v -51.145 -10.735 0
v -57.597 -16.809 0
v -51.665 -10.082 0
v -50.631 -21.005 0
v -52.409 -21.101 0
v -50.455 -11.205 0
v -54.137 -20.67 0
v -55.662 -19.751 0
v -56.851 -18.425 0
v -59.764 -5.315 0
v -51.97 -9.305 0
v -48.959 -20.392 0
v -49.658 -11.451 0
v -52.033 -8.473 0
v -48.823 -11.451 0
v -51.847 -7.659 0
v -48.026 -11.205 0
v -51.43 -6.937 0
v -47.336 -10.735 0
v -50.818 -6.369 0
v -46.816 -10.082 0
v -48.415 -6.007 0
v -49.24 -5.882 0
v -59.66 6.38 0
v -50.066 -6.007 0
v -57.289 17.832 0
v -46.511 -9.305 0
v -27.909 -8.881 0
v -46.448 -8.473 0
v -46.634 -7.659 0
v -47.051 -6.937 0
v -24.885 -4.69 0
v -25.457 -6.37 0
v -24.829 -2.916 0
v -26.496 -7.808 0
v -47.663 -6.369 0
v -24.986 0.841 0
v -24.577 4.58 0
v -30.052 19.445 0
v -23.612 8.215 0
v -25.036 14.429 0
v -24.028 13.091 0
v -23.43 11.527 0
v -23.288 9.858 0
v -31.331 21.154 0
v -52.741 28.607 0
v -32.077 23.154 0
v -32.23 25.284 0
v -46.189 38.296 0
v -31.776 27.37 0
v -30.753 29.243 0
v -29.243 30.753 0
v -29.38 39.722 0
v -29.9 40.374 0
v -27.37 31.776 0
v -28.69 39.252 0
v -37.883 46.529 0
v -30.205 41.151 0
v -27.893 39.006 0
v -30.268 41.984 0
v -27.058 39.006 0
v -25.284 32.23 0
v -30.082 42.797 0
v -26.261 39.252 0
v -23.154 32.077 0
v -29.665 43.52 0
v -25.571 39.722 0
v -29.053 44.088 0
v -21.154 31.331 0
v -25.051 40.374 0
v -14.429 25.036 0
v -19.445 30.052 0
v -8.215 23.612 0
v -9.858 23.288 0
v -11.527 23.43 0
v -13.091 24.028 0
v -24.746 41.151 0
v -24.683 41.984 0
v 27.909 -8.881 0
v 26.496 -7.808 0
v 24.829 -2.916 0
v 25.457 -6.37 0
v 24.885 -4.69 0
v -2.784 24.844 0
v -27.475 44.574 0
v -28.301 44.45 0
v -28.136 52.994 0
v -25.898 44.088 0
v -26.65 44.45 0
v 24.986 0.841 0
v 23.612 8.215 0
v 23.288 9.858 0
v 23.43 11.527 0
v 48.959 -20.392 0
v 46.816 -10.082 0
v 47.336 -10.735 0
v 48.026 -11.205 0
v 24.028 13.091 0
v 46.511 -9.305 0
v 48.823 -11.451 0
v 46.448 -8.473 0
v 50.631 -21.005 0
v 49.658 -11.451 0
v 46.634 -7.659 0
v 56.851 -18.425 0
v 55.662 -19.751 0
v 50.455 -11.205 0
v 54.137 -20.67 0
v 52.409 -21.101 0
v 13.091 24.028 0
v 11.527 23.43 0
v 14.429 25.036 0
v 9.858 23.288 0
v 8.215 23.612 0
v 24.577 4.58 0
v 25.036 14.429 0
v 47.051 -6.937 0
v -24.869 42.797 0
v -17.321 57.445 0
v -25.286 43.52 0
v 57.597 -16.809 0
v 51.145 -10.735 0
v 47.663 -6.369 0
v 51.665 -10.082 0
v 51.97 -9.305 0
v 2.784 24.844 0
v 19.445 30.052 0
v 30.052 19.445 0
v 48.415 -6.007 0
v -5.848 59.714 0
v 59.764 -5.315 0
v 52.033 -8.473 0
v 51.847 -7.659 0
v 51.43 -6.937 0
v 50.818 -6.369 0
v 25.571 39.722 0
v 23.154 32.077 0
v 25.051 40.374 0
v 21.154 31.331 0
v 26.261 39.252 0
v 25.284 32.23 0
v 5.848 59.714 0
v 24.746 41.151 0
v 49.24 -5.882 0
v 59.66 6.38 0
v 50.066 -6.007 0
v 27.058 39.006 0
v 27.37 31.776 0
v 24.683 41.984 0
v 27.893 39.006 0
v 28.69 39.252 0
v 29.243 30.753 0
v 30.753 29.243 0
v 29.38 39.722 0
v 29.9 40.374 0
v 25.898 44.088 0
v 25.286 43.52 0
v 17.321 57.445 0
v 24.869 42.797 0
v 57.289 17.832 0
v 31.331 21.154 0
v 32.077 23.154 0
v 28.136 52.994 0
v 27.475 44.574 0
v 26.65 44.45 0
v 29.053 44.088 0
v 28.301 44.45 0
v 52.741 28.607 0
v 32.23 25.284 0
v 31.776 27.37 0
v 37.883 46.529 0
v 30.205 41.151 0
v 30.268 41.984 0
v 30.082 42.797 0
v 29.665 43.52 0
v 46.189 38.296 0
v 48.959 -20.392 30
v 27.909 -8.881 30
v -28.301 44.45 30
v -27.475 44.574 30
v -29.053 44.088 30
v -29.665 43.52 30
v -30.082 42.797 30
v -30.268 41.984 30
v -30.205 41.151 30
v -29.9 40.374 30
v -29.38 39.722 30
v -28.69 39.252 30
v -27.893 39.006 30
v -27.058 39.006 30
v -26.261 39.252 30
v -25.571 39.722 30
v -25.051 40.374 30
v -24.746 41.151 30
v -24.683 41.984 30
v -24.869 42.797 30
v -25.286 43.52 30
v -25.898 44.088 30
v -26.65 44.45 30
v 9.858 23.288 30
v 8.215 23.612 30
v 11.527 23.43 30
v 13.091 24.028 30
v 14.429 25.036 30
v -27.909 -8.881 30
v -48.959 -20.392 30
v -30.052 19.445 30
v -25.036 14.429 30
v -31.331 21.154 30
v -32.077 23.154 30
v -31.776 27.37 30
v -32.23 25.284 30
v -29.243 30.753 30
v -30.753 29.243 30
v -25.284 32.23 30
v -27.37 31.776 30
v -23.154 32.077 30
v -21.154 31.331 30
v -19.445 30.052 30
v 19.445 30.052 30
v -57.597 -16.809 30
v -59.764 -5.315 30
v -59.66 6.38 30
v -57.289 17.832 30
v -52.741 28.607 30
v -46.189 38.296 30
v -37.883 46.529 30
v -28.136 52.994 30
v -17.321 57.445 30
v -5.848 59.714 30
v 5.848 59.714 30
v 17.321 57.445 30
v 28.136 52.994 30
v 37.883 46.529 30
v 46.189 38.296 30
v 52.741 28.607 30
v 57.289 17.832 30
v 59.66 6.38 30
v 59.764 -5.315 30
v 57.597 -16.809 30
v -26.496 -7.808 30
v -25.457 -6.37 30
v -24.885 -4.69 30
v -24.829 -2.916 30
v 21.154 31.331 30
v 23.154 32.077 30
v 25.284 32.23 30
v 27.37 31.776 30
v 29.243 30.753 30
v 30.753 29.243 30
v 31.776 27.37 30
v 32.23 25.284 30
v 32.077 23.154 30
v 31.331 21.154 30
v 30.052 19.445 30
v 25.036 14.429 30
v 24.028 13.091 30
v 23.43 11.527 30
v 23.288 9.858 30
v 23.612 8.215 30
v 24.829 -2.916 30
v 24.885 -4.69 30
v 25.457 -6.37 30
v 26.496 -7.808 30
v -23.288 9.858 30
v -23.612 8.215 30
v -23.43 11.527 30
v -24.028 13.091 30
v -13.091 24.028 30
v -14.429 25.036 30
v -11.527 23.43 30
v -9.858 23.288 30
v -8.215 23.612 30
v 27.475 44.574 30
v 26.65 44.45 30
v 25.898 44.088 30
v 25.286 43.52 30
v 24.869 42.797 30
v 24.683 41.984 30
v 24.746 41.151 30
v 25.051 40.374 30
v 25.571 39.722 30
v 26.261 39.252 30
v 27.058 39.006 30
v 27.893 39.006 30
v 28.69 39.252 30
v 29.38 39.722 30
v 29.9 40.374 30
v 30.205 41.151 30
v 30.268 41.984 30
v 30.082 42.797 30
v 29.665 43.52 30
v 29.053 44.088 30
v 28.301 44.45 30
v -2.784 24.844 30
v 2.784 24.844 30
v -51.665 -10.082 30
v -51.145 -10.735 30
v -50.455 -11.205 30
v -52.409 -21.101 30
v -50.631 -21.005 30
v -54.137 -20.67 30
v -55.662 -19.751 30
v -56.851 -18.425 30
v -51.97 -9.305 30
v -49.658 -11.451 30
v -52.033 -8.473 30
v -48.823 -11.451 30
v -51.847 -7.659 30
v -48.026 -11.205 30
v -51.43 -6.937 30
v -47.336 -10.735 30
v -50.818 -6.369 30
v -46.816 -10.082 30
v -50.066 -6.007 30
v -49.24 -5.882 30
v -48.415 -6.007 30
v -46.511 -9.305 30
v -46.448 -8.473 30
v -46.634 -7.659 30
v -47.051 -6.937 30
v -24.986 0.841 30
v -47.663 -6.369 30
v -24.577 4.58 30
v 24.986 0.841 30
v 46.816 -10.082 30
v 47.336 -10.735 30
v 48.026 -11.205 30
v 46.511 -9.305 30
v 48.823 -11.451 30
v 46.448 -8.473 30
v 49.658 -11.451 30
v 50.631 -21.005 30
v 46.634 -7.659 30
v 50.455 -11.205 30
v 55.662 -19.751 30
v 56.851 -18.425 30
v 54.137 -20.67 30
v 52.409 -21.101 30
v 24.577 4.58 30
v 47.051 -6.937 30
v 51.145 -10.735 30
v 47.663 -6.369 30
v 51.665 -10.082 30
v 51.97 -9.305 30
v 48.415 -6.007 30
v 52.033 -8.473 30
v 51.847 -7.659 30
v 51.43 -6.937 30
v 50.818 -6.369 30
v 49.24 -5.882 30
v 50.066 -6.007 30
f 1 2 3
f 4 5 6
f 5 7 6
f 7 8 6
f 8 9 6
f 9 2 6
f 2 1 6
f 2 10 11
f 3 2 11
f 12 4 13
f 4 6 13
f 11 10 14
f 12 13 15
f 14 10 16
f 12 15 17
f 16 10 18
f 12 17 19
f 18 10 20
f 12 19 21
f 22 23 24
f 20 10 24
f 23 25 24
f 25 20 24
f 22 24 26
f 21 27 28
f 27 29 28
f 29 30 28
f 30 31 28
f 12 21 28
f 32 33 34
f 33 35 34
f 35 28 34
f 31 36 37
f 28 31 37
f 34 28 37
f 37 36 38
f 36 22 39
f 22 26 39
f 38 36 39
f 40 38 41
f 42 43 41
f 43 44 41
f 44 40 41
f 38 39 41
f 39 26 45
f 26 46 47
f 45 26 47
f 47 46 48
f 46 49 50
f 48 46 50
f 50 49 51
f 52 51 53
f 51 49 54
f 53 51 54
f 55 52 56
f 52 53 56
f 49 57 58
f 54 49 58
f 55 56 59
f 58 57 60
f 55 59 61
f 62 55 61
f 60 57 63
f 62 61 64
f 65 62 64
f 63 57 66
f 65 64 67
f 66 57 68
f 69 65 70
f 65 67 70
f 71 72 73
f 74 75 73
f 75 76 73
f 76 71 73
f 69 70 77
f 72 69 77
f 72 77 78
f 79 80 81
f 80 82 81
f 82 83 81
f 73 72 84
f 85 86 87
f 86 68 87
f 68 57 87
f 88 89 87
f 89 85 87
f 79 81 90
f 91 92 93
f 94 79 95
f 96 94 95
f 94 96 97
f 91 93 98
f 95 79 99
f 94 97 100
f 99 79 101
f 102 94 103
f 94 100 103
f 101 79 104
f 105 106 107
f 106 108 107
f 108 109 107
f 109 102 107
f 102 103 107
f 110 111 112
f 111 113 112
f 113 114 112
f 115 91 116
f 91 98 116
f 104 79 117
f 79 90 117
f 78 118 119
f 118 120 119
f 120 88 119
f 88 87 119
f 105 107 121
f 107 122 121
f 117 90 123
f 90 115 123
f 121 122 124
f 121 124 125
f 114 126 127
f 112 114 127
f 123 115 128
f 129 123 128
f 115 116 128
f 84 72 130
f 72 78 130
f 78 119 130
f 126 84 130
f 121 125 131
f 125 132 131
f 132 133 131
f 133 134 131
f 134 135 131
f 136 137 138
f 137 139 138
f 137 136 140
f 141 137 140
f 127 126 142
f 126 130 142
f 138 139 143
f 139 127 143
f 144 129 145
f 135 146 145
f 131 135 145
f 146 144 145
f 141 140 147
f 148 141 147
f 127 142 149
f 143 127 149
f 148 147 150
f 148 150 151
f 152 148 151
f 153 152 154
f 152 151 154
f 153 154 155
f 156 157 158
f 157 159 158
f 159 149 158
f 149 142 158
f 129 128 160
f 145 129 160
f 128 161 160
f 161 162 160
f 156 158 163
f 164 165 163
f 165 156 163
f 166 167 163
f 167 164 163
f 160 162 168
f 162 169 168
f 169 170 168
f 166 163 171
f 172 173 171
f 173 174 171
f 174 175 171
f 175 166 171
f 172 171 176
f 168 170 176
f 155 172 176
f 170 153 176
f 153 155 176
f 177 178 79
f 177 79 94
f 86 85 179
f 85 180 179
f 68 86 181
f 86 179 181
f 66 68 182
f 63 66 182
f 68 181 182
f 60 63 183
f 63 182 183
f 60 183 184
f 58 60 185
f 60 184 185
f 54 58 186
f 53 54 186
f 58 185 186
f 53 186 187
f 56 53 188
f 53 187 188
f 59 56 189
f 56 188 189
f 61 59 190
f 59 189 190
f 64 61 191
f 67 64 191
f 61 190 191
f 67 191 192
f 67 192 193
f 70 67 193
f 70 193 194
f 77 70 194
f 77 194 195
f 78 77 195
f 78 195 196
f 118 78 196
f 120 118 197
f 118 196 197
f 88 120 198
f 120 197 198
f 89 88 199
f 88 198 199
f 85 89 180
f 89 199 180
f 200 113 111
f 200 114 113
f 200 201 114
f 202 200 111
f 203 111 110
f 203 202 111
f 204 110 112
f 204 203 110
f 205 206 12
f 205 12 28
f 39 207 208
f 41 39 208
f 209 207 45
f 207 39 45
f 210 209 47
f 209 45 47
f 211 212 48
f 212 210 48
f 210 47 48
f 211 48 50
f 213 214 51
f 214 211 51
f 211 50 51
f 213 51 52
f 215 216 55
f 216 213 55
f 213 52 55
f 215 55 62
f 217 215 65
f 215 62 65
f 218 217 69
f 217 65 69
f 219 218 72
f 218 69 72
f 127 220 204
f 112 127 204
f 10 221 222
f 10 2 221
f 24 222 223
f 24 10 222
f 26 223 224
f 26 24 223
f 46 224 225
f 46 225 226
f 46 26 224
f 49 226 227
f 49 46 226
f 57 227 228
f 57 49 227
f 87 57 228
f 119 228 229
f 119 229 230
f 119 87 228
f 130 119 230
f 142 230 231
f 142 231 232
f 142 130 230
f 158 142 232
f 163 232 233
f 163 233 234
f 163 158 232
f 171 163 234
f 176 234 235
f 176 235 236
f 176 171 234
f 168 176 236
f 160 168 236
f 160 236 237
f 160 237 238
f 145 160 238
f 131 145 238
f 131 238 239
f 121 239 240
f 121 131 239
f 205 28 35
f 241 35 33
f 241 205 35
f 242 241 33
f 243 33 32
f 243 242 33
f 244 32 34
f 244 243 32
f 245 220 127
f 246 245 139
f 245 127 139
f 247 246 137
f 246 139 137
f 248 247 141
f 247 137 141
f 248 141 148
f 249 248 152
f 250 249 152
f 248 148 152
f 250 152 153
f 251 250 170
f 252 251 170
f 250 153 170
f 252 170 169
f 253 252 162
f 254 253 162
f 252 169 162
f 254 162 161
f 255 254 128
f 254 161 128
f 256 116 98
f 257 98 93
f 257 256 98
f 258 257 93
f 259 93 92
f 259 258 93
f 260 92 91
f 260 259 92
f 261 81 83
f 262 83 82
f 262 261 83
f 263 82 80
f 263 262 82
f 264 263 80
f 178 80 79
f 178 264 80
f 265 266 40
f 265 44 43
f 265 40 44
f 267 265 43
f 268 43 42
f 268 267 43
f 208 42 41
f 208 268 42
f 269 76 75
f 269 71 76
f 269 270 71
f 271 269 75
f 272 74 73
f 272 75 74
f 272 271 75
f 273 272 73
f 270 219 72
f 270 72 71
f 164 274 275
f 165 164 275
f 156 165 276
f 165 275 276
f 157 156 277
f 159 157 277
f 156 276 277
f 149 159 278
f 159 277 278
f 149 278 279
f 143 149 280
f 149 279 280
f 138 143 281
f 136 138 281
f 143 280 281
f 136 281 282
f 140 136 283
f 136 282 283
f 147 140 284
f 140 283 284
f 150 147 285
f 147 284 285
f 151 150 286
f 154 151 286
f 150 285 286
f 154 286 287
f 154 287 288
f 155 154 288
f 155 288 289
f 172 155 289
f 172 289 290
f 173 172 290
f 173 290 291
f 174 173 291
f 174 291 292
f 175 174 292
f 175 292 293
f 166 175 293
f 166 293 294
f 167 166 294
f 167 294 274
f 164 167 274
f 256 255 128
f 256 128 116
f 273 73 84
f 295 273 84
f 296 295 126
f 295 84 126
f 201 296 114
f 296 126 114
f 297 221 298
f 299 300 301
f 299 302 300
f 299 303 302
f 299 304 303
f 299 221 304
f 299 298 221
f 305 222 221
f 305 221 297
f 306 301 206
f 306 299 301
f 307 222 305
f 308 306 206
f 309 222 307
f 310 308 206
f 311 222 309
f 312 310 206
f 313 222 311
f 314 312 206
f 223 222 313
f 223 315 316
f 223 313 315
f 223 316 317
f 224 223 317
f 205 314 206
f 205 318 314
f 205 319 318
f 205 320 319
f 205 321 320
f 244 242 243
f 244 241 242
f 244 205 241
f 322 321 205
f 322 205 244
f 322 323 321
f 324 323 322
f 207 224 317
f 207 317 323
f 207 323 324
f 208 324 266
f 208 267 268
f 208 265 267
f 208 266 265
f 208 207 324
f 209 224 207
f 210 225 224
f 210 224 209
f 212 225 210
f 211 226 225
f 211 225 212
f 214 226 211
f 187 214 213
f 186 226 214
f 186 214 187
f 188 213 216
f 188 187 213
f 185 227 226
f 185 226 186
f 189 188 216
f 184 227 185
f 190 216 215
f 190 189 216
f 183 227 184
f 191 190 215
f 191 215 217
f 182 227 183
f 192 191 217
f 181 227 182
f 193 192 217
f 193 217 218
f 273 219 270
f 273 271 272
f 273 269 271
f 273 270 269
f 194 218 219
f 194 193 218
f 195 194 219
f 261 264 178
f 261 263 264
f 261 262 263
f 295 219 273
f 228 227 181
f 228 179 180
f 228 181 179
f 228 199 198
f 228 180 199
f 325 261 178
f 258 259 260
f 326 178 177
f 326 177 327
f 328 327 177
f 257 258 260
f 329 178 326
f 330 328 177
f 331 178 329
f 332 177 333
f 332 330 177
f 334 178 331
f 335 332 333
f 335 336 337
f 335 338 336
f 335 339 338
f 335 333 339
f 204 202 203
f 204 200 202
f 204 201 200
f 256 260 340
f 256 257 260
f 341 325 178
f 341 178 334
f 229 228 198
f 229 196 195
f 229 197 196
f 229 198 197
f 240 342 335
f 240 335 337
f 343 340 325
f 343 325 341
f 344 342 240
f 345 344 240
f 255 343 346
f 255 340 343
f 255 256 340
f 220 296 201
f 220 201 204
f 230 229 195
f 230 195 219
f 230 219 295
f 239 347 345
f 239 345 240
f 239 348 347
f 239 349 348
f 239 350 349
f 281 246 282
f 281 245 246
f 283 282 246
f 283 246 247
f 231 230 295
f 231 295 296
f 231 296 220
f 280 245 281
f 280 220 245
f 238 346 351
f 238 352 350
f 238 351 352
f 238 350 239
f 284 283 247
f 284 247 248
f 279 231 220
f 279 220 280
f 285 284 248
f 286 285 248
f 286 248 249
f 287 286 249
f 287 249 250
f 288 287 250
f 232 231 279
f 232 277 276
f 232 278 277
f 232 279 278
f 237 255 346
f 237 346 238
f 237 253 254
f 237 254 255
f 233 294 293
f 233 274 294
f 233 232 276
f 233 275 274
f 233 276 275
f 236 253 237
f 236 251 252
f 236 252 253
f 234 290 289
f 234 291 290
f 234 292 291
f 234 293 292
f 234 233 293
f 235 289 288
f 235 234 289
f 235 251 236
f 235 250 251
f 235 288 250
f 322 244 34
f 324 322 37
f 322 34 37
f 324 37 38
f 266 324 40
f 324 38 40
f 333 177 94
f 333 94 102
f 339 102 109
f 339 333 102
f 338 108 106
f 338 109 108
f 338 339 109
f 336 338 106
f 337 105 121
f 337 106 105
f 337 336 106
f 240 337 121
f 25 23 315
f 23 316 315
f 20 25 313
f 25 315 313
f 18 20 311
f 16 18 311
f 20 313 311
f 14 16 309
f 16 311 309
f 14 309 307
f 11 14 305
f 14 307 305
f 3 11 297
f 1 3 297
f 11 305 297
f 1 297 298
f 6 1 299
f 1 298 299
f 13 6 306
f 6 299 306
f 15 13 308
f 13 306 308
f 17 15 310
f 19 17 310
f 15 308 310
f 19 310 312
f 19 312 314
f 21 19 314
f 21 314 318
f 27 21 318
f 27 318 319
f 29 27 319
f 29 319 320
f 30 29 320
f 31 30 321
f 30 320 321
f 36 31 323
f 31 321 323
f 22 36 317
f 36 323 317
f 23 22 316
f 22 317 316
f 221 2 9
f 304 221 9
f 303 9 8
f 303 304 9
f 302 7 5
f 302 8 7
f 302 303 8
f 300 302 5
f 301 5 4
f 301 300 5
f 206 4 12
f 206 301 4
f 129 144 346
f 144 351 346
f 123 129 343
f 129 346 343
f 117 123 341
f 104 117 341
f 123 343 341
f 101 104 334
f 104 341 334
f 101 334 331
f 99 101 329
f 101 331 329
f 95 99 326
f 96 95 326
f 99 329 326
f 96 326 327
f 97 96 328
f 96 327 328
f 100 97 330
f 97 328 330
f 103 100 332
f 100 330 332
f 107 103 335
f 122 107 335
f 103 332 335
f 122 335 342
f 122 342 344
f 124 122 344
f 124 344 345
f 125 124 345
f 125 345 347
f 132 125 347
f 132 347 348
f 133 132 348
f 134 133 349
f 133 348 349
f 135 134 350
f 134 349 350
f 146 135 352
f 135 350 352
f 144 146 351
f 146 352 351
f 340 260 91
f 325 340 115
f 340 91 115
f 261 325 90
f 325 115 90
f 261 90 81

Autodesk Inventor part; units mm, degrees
ref_plane "YZ Plane" through (0, 0, 0) normal (1, 0, 0) x (0, 1, 0)
ref_plane "XZ Plane" through (0, 0, 0) normal (0, 1, 0) x (-1, 0, 0)
ref_plane "XY Plane" through (0, 0, 0) normal (0, 0, 1) x (1, 0, 0)
sketch "Sketch1" plane through (0, 0, 0) normal (0, 0, 1) x (1, 0, 0)
  circle A0 centre (0, 0) radius 60
  circle A1 centre (0, -84) radius 72 construction
  circle A2 centre (0, 0) radius 12 construction
  line L0 (0, -84) -> (0, 0) construction
  line L1 (0, 0) -> (0, 60) construction
  circle A3 centre (0, 0) radius 35 construction
  circle A4 centre (0, 0) radius 50 construction
  line L2 (-50.3895, -32.5714) -> (-8.3983, 8.5714) construction
  line L3 (8.3983, 8.5714) -> (50.3895, -32.5714) construction
  circle A5 centre (0, 0) radius 25
  circle A6 centre (0, 0) radius 60
  line L4 (-50.3895, -32.5714) -> (-24.0638, -6.7776)
  line L5 (24.0638, -6.7776) -> (50.3895, -32.5714)
  circle A7 centre (-24.7487, 24.7487) radius 7.5
  circle A8 centre (24.7487, 24.7487) radius 7.5
  line L6 (-24.7487, 24.7487) -> (24.7487, 24.7487) construction
  circle A9 centre (-24.7487, -24.7487) radius 7.5 construction
  circle A10 centre (24.7487, -24.7487) radius 7.5 construction
  line L7 (-24.7487, 24.7487) -> (-24.7487, -24.7487) construction
  line L8 (24.7487, -24.7487) -> (24.7487, 24.7487) construction
  line L9 (24.7487, -24.7487) -> (-24.7487, -24.7487) construction
  line L10 (-30.052, 19.4454) -> (-22.1667, 11.5601)
  line L11 (-19.4454, 30.052) -> (-11.5601, 22.1667)
  line L12 (19.4454, 30.052) -> (11.5601, 22.1667)
  line L13 (30.052, 19.4454) -> (22.1667, 11.5601)
  line L14 (-49.2404, -8.6824) -> (0, 0) construction
  line L15 (-55.0993, -23.75) -> (-24.0638, -6.7776)
  line L16 (24.0638, -6.7776) -> (55.0993, -23.75)
  point P0 (-27.4754, 41.7744)
  point P1 (27.4754, 41.7744)
  point P2 (49.2404, -8.6824)
  dimension "d0" = 120
  dimension "d4" = 100
  dimension "d1" = 144
  dimension "d2" = 24
  dimension "d3" = 70
  dimension "d5" = 50
  dimension "d6" = 15
  dimension "d7" = 15
  dimension "d8" = 15
  dimension "d9" = 15
  dimension "d10" = 45
  dimension "d11" = 45
  dimension "d12" = 100
  dimension "d15" = 200
  dimension "d30" = 10
  dimension "d32" = 10
extrude "Extrusion1" add sketch "Sketch1" along normal blind 30 contours A0 L16 A5 L13 A8 L12 L11 A7 L10 L15
fillet "Fillet1" radius 6 8 edges at (24.0638, -6.7776, 15) (-24.0638, -6.7776, 15) (-22.1667, 11.5601, 15) (-11.5601, 22.1667, 15) (11.5601, 22.1667, 15) (22.1667, 11.5601, 15) (-55.0993, -23.75, 15) (55.0993, -23.75, 15)
hole "Hole1" at (-49.2404, -8.6824, 0) at (-27.4754, 41.7744, 0) at (27.4754, 41.7744, 0) at (49.2404, -8.6824, 0) direction (0, 0, 1) diameter 5.6 end through all
properties part number "RT_ARM_MC_008_Capstand_Support"
